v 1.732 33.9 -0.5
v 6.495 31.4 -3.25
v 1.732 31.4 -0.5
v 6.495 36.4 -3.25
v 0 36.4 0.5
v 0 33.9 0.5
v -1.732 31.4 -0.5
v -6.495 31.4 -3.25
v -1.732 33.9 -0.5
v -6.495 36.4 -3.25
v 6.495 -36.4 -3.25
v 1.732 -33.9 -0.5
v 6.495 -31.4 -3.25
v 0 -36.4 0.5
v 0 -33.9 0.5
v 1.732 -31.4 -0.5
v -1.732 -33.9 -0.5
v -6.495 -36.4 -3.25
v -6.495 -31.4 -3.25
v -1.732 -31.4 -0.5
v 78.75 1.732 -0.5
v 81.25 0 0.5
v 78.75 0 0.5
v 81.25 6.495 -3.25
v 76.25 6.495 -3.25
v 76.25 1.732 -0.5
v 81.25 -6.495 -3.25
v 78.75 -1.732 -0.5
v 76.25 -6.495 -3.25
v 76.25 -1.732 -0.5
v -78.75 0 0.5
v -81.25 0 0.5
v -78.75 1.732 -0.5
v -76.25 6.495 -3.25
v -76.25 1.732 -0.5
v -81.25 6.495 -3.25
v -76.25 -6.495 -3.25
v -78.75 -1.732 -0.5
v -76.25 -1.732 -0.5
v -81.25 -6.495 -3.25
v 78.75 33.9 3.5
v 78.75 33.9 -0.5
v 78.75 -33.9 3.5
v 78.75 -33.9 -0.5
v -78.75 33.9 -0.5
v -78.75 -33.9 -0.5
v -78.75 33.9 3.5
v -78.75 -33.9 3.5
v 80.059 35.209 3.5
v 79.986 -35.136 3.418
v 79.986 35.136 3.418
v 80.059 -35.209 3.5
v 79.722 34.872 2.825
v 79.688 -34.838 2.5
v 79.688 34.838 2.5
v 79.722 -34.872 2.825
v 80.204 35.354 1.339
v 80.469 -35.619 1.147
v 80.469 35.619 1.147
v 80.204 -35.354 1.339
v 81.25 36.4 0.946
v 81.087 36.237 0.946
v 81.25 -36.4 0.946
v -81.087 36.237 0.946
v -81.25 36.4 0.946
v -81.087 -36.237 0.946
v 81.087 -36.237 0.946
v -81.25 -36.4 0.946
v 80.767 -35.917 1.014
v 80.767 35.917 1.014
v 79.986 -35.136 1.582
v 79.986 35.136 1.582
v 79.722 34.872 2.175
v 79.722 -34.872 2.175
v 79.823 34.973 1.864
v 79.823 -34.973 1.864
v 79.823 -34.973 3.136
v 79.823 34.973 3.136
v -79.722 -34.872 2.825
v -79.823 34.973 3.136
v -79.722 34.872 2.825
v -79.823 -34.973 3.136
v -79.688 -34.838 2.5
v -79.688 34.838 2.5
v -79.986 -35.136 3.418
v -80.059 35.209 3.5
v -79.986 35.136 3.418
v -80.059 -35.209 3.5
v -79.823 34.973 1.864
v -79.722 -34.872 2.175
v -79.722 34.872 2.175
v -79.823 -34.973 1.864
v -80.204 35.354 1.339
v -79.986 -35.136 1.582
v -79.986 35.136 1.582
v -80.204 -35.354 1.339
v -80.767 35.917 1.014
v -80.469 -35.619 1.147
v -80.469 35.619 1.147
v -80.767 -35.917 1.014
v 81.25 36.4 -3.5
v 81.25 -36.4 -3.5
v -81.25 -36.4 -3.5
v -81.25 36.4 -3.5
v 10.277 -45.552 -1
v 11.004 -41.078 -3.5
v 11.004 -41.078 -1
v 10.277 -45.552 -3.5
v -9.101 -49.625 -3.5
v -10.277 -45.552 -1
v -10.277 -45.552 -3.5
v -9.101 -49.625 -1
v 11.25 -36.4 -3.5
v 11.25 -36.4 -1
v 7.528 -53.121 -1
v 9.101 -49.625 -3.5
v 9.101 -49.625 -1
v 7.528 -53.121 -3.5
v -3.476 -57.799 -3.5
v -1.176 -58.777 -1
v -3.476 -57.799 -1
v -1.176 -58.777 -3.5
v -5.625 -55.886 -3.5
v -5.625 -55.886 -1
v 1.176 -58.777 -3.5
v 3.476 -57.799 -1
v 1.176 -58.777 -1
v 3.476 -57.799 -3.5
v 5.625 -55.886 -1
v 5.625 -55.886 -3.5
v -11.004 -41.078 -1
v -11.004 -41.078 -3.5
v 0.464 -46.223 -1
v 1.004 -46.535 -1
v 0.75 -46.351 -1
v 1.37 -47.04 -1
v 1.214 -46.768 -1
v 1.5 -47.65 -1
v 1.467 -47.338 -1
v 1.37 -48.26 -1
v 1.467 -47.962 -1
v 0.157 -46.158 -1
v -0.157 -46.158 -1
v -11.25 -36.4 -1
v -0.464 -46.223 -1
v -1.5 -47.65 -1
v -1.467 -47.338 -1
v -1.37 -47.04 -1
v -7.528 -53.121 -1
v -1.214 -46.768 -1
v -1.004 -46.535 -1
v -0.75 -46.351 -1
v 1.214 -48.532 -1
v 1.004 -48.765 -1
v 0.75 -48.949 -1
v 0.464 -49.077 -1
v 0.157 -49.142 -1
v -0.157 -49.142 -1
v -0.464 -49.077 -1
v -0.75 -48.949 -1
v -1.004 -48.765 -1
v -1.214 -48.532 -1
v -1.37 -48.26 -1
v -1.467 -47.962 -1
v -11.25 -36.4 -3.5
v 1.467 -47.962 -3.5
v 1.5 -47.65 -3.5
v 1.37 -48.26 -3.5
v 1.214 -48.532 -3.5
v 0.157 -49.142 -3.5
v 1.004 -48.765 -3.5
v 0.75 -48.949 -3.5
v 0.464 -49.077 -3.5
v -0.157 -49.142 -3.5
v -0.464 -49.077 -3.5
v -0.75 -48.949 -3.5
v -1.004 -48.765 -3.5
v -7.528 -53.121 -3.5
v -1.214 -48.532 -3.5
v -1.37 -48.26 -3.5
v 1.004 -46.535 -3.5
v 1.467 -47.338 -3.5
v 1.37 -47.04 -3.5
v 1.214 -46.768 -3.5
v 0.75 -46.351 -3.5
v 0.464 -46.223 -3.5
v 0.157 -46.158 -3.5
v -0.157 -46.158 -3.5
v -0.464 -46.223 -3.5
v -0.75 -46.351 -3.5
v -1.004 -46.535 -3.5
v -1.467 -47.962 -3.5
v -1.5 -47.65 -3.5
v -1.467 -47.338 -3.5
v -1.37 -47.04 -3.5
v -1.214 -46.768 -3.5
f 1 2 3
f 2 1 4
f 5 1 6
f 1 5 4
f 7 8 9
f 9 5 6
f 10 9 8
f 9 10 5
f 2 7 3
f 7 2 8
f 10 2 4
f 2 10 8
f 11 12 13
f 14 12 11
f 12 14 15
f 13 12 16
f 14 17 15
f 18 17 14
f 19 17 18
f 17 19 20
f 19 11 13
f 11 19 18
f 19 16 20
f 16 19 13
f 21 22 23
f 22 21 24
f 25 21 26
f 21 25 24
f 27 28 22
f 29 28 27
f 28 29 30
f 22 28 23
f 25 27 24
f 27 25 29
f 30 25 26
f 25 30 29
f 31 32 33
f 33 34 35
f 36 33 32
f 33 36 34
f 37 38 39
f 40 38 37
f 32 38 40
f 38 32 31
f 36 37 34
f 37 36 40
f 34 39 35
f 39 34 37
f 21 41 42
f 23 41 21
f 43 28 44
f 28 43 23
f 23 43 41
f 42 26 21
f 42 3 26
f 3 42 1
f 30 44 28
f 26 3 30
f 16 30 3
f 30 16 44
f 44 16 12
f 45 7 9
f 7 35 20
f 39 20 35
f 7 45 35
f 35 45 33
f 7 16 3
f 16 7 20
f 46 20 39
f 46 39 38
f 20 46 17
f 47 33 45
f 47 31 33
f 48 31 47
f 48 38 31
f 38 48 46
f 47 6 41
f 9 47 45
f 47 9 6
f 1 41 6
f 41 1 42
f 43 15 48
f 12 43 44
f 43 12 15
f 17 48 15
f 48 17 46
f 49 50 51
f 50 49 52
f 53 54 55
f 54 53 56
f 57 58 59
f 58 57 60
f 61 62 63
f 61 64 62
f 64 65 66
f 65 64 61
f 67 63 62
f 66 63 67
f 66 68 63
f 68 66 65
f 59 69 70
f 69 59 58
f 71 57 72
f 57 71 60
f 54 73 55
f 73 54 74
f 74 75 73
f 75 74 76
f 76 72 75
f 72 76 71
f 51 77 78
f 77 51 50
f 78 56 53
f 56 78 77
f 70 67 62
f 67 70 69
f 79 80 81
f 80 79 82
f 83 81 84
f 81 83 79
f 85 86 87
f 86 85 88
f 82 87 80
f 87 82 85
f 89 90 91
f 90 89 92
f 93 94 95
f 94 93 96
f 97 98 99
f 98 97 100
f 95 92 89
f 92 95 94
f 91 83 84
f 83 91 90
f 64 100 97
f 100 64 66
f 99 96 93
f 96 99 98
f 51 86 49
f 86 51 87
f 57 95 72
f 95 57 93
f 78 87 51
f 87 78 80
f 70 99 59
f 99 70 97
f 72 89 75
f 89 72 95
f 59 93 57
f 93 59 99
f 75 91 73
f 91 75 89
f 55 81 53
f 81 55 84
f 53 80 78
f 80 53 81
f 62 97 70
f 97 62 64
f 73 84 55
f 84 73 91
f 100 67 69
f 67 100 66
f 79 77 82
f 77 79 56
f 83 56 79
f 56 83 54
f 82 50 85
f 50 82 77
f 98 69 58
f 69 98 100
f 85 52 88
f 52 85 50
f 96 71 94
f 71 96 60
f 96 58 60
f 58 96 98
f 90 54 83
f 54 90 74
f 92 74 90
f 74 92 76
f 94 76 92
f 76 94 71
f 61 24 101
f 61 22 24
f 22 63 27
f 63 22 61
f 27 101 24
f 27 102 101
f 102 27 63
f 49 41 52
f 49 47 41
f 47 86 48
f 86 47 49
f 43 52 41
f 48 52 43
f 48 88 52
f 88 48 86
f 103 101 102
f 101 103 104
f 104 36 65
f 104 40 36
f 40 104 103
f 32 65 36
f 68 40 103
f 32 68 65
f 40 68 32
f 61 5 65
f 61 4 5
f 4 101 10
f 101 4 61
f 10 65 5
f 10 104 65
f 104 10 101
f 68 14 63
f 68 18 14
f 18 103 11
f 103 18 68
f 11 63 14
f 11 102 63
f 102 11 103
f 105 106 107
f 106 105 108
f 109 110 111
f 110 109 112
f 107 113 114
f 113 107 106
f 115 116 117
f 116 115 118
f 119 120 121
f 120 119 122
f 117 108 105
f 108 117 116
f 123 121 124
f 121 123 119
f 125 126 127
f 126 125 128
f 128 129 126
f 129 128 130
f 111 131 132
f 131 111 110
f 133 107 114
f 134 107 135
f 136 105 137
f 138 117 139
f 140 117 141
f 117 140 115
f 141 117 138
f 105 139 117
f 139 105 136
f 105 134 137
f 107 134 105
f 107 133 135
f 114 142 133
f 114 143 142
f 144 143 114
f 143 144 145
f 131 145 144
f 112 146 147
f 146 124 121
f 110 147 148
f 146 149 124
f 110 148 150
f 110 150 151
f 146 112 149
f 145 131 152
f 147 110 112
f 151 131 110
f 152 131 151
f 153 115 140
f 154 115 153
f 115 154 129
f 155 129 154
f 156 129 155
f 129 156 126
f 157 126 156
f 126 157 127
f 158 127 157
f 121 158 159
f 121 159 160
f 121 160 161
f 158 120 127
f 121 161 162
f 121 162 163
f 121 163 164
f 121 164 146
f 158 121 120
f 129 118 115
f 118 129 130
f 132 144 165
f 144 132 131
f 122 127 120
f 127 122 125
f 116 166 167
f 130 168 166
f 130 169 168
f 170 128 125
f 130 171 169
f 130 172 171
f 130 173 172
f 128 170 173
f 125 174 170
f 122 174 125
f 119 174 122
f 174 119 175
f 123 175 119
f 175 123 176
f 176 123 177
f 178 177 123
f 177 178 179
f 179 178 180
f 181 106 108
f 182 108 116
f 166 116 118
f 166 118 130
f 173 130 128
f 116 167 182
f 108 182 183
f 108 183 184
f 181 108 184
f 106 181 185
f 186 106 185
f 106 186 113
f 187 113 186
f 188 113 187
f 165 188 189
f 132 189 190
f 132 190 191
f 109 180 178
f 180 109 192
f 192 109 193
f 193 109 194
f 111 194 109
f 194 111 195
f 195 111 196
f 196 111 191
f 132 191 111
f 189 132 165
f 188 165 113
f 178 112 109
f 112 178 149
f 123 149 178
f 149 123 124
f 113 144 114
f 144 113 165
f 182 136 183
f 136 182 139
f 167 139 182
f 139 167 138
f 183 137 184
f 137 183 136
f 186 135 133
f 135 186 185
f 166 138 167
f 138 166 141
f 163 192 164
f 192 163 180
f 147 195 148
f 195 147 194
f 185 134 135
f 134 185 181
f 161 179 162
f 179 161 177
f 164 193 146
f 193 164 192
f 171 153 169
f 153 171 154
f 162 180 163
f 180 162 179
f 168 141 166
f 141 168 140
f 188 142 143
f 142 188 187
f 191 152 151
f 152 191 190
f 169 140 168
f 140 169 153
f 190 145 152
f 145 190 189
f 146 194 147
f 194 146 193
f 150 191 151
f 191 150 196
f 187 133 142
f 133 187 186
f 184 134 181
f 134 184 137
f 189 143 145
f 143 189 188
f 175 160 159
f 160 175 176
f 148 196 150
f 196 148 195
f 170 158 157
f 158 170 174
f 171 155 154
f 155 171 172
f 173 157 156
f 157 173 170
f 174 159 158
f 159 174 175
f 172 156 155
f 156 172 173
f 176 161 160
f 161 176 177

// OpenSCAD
//------------------Variables------------------\\ 

		//----Global Values----\\
			//The default unit in OpenSCAD is mm and this unit variable allows one to change the variables in the code with units other than mm. Default is 1, for mm, but cm is 10 and inches is 25.4. Note that this entails that you change EVERY variable (except maybe sfn)  so that one piece of the model is not ridiculously bigger/smaller than the other parts. 
				unit=1;

			//The detail in the cylinders/spheres of the shape.
				sfn=30;

		//----Bill Specifics----\\

			//The length of the bill.
				billength= 157.5;

			//The width of the bill. 
				billwidth = 67.8;

			//The thickness of the frame. 
				framethick = 5;
			
			//Bottom Thickness
				botthick = 2 ;

		//----Frame Specifics----\\

			//The border of the frame length-wise. This is the measurement from the inside of the frame to the outisde on the length (x) axis. The cylinders that shape the frame use this measurement.
				xframe = 5;

			//The border of the frame width-wise. This is the measurement from the inside of the frame to the outisde on the width (y) axis.
				yframe = 5;
		
			//How prominent the frame shaping is. Play with this value. Default is 2.
				frameshapethick = 1.6;

			//How raised the frame shaping is. Play with this value as well. 
				frameshaperaise = 0;
		
	//----Paper clip slit size----\\\
		//Width of the paperclip slit. Adjust this value if as you want. 
		slitwidth = 10;
		
		//Height of the slit. This is actually a size control but it mainly changes the size.
		slitheight = 10;

		//Where the slit is. Slit is in the middle by default but depending on size you may have to raise or lower this value.
		slitlift =-4;

		//Shape of slit in sides. Default is 3 (triangle) as its overhangs are not unbearable.
		slitshape=3;

		//Slit scale (x,y,z)
		slitscalex= 0.5;
		slitscaley= 1.5;
		slitscalez= 1;
	
	//----Hook sizing----\\
		//Hook size
		hooksize=22.5;

		//Hook hole size
		hookhole=3;

		//Hook thickness
		hookthick=2.5;

//-------------------Modules-------------------\\ 

	//----Basic Frame Shapes----\\
		module bill() {
			cube([billength*unit, billwidth*unit,framethick*unit], center=true);
		}

		module outsideframe() { 
			cube([(billength+xframe)*unit, (billwidth+yframe)*unit, (framethick+botthick)*unit], center=true);
		}

	//----Frame shaping.----\\
		//Frame shaping cylinder on the X Axis.
			module xfsc() {
				cylinder(r=(framethick*unit)/(frameshapethick*2), h=(billwidth+yframe)*unit+xframe, center=true, $fn=sfn);
			}

		//Frame shaping cylinder on the Y Axis.
			module yfsc() {
				cylinder(r=(framethick*unit)/(frameshapethick*2), h=(billength+xframe)*unit+yframe, center=true, $fn=sfn);
			}

		//Frameshaping general module
			module frameshaping() {
				translate([(billength/2)*unit+xframe/2, 0, (framethick/2)*unit]) {
					rotate([90,0,0]) {
						xfsc();
					}
				}
				translate([(-billength/2)*unit-xframe/2, 0, (framethick/2)*unit]) {
					rotate([90,0,0]) {
						xfsc();
					}
				}

				translate([0, (billwidth/2)*unit+yframe/2, (framethick/2)*unit]) {
					rotate([90,0,90]) {
						yfsc();
					}
				}
				translate([0, (-billwidth/2)*unit-yframe/2, (framethick/2)*unit]) {
					rotate([90,0,90]) {
						yfsc();
					}
				}
			}

	



	//A slit on every side for a paper clip to hold it down
	module clipslit() {
		translate([0, ((billwidth+yframe)/2)*unit, slitlift*unit]) {
			rotate([0,270,90]) {
				scale([slitscalex,slitscaley,slitscalez]) {
					cylinder(r=(slitheight/2)*unit, h=slitwidth*unit, $fn=slitshape, center=true);
				}
			}
		}
		translate([0, ((billwidth+yframe)/2)*-unit, slitlift*unit]) {
			rotate([0,270,90]) {
				scale([slitscalex,slitscaley,slitscalez]) {
					cylinder(r=(slitheight/2)*unit, h=slitwidth*unit, $fn=slitshape, center=true);
				}
			}
		}
		translate([((billength+xframe)/2)*unit, 0, slitlift*unit]) {
			rotate([0,270,0]) {
				scale([slitscalex,slitscaley,slitscalez]) {
					cylinder(r=(slitheight/2)*unit, h=slitwidth*unit, $fn=slitshape, center=true);
				}
			}
		}
		translate([-unit*((billength+xframe)/2), 0, slitlift*unit]) {
			rotate([0,270,0]) {
				scale([slitscalex,slitscaley,slitscalez]) {
					cylinder(r=(slitheight/2)*unit, h=slitwidth*unit, $fn=slitshape, center=true);
				}
			}
		}				
	}

		
	module hook() {
		translate([0,-((billwidth+xframe)/2)*unit, (-(framethick+botthick)/2)*unit ]) {
			difference() {
				scale([1,2,1]) {
					cylinder(r=(hooksize/2)*unit, h=hookthick*unit, $fn=sfn);
				}
				translate([(-hooksize/2)*unit, 0]) {
					cube([hooksize*unit, hooksize*unit, hookthick*unit]);
				}
				translate([0, (-hooksize/2)*unit, 0]) {
					cylinder(r=(hookhole/2)*unit, h=hookthick*unit, $fn=sfn);
				}
			}
		}
	}


	//Plating module
	module frame() {
		difference() {
			outsideframe();
			translate([0,0, botthick]) {
				bill();
				clipslit();
			}
			translate([0,0, frameshaperaise]) {
				frameshaping();
			}
		}
	}

frame();
hook();
